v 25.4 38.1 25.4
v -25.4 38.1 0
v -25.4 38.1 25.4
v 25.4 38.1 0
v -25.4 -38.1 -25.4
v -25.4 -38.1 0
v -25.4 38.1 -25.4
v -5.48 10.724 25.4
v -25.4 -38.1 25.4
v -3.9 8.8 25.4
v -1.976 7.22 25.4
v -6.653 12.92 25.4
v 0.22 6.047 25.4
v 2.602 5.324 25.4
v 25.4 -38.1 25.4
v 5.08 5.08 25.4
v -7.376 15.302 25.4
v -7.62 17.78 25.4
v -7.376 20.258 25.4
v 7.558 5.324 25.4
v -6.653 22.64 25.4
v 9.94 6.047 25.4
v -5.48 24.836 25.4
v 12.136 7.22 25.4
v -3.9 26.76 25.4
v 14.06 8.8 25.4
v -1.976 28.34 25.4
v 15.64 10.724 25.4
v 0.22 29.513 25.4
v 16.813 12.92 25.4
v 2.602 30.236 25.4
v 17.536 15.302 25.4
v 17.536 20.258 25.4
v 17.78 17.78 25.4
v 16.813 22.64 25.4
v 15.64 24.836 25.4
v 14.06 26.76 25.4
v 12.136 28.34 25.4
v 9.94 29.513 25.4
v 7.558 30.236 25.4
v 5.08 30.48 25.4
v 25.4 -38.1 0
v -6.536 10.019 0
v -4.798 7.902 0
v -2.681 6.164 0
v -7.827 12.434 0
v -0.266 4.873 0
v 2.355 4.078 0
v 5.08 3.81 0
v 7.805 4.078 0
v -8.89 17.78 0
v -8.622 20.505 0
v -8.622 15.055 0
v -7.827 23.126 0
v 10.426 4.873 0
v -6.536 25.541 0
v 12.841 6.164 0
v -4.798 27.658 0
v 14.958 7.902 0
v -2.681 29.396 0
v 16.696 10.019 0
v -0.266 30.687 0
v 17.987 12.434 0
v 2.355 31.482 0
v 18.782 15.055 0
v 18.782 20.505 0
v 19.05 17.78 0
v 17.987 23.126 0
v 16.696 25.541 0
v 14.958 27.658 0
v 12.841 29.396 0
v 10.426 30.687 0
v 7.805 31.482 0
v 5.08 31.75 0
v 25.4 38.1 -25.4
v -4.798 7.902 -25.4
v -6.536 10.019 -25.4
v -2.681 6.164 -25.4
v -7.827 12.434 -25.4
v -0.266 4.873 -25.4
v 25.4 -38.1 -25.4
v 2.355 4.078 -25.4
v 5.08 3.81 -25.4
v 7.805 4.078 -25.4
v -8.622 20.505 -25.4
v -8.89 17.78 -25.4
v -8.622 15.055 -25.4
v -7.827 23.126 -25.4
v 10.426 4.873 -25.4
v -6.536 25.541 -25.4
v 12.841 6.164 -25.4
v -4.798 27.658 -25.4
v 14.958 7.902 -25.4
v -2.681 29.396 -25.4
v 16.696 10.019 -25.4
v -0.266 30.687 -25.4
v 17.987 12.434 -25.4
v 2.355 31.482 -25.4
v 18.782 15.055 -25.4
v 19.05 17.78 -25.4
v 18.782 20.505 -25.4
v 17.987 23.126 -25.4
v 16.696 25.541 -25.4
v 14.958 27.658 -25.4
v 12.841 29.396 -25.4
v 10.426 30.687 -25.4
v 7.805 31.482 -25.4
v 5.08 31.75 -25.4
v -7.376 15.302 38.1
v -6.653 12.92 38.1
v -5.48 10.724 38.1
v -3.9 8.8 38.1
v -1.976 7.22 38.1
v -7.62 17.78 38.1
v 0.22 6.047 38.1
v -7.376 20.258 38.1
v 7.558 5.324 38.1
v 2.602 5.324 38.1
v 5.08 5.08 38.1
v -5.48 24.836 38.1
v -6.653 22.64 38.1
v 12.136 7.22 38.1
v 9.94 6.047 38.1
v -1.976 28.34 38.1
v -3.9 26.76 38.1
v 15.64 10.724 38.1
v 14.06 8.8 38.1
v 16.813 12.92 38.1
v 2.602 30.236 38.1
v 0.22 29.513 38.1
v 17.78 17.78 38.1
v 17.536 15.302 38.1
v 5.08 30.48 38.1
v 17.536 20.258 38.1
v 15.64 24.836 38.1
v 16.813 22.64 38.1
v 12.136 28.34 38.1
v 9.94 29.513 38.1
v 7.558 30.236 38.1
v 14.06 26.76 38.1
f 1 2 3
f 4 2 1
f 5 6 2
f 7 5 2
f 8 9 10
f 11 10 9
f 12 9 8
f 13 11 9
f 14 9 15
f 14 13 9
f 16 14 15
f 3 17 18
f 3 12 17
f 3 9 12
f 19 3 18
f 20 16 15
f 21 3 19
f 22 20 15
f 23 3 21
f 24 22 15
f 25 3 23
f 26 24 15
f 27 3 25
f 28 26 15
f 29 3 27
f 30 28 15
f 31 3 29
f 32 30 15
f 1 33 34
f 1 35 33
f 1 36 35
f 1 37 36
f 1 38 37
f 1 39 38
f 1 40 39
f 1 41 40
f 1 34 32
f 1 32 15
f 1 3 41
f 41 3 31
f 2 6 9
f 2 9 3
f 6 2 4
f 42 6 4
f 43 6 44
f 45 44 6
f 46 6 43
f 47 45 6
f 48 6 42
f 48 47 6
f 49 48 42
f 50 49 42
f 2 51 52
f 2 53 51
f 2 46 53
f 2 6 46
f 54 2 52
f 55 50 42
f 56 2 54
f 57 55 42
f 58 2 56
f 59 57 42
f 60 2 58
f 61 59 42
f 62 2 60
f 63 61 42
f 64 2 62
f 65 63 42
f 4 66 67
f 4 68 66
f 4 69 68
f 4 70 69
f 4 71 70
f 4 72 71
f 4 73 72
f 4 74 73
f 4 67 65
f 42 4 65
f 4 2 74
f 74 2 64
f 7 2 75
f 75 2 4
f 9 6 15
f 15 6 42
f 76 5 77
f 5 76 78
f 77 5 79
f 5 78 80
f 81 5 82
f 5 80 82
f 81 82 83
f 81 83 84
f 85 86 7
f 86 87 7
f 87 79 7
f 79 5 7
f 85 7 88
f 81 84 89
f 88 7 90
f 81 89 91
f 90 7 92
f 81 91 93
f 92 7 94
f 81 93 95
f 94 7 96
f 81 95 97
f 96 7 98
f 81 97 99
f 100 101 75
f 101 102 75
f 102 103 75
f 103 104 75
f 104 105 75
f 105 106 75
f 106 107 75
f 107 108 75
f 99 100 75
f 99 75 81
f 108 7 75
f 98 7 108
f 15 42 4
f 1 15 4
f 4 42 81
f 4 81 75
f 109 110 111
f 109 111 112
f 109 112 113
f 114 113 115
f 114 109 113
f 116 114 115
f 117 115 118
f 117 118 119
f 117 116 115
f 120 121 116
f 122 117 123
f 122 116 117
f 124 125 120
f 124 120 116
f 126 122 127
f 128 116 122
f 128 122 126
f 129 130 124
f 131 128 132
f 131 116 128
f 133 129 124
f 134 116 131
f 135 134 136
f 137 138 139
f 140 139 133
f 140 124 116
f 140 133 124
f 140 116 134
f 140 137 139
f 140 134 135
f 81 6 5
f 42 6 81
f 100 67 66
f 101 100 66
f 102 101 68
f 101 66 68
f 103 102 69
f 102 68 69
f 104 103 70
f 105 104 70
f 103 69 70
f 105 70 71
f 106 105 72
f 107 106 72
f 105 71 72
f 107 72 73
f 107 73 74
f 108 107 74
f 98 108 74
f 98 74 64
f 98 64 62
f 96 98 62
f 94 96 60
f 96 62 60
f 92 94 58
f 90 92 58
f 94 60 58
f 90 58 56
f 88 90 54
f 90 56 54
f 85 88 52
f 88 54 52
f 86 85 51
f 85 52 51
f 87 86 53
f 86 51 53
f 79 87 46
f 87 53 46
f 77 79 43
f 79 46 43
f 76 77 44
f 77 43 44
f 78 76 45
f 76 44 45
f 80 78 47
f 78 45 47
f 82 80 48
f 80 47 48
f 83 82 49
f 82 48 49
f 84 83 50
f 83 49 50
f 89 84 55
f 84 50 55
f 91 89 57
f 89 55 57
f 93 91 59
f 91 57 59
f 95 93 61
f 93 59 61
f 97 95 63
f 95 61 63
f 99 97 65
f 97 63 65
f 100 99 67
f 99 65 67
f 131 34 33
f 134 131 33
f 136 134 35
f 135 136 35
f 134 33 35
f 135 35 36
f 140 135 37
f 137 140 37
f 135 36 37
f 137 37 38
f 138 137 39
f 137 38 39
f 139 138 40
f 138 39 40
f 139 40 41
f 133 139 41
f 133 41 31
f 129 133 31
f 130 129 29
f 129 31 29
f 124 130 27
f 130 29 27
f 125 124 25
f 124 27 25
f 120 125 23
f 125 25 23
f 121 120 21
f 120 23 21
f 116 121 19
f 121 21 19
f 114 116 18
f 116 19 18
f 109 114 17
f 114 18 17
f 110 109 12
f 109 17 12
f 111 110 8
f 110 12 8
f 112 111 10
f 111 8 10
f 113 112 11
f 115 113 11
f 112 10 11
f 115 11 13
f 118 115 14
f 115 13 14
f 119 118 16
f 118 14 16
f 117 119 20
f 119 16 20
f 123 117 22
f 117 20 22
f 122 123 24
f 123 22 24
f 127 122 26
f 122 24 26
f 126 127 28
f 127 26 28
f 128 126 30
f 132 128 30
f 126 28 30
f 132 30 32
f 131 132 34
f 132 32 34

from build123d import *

# Parameters (mm, degrees)
F0_W     = 50.8
F0_H     = 76.2
F1_DEPTH = 25.4
F2_R     = 12.7
F3_DEPTH = 12.7
F4_W     = 50.8
F4_H     = 76.2
F4_R     = 13.97
F5_DEPTH = 25.4


with BuildPart() as f1:
    # F0 (on Top) → F1 (new body)
    with BuildSketch(Plane.XY):
        Rectangle(F0_W, F0_H)
    extrude(amount=F1_DEPTH)

    # F2 (on face) → F3 (join)
    with BuildSketch(Plane.XY.offset(25.4)):
        with Locations((5.08, 17.78)):
            Circle(F2_R)
    extrude(amount=F3_DEPTH)


with BuildPart() as f5:
    # F4 (on Top) → F5 (new body)
    with BuildSketch(Plane.XY):
        Rectangle(F4_W, F4_H)
        with Locations((5.08, 17.78)):
            Circle(F4_R, mode=Mode.SUBTRACT)
    extrude(amount=-F5_DEPTH)


solid = Compound([f1.part, f5.part])
